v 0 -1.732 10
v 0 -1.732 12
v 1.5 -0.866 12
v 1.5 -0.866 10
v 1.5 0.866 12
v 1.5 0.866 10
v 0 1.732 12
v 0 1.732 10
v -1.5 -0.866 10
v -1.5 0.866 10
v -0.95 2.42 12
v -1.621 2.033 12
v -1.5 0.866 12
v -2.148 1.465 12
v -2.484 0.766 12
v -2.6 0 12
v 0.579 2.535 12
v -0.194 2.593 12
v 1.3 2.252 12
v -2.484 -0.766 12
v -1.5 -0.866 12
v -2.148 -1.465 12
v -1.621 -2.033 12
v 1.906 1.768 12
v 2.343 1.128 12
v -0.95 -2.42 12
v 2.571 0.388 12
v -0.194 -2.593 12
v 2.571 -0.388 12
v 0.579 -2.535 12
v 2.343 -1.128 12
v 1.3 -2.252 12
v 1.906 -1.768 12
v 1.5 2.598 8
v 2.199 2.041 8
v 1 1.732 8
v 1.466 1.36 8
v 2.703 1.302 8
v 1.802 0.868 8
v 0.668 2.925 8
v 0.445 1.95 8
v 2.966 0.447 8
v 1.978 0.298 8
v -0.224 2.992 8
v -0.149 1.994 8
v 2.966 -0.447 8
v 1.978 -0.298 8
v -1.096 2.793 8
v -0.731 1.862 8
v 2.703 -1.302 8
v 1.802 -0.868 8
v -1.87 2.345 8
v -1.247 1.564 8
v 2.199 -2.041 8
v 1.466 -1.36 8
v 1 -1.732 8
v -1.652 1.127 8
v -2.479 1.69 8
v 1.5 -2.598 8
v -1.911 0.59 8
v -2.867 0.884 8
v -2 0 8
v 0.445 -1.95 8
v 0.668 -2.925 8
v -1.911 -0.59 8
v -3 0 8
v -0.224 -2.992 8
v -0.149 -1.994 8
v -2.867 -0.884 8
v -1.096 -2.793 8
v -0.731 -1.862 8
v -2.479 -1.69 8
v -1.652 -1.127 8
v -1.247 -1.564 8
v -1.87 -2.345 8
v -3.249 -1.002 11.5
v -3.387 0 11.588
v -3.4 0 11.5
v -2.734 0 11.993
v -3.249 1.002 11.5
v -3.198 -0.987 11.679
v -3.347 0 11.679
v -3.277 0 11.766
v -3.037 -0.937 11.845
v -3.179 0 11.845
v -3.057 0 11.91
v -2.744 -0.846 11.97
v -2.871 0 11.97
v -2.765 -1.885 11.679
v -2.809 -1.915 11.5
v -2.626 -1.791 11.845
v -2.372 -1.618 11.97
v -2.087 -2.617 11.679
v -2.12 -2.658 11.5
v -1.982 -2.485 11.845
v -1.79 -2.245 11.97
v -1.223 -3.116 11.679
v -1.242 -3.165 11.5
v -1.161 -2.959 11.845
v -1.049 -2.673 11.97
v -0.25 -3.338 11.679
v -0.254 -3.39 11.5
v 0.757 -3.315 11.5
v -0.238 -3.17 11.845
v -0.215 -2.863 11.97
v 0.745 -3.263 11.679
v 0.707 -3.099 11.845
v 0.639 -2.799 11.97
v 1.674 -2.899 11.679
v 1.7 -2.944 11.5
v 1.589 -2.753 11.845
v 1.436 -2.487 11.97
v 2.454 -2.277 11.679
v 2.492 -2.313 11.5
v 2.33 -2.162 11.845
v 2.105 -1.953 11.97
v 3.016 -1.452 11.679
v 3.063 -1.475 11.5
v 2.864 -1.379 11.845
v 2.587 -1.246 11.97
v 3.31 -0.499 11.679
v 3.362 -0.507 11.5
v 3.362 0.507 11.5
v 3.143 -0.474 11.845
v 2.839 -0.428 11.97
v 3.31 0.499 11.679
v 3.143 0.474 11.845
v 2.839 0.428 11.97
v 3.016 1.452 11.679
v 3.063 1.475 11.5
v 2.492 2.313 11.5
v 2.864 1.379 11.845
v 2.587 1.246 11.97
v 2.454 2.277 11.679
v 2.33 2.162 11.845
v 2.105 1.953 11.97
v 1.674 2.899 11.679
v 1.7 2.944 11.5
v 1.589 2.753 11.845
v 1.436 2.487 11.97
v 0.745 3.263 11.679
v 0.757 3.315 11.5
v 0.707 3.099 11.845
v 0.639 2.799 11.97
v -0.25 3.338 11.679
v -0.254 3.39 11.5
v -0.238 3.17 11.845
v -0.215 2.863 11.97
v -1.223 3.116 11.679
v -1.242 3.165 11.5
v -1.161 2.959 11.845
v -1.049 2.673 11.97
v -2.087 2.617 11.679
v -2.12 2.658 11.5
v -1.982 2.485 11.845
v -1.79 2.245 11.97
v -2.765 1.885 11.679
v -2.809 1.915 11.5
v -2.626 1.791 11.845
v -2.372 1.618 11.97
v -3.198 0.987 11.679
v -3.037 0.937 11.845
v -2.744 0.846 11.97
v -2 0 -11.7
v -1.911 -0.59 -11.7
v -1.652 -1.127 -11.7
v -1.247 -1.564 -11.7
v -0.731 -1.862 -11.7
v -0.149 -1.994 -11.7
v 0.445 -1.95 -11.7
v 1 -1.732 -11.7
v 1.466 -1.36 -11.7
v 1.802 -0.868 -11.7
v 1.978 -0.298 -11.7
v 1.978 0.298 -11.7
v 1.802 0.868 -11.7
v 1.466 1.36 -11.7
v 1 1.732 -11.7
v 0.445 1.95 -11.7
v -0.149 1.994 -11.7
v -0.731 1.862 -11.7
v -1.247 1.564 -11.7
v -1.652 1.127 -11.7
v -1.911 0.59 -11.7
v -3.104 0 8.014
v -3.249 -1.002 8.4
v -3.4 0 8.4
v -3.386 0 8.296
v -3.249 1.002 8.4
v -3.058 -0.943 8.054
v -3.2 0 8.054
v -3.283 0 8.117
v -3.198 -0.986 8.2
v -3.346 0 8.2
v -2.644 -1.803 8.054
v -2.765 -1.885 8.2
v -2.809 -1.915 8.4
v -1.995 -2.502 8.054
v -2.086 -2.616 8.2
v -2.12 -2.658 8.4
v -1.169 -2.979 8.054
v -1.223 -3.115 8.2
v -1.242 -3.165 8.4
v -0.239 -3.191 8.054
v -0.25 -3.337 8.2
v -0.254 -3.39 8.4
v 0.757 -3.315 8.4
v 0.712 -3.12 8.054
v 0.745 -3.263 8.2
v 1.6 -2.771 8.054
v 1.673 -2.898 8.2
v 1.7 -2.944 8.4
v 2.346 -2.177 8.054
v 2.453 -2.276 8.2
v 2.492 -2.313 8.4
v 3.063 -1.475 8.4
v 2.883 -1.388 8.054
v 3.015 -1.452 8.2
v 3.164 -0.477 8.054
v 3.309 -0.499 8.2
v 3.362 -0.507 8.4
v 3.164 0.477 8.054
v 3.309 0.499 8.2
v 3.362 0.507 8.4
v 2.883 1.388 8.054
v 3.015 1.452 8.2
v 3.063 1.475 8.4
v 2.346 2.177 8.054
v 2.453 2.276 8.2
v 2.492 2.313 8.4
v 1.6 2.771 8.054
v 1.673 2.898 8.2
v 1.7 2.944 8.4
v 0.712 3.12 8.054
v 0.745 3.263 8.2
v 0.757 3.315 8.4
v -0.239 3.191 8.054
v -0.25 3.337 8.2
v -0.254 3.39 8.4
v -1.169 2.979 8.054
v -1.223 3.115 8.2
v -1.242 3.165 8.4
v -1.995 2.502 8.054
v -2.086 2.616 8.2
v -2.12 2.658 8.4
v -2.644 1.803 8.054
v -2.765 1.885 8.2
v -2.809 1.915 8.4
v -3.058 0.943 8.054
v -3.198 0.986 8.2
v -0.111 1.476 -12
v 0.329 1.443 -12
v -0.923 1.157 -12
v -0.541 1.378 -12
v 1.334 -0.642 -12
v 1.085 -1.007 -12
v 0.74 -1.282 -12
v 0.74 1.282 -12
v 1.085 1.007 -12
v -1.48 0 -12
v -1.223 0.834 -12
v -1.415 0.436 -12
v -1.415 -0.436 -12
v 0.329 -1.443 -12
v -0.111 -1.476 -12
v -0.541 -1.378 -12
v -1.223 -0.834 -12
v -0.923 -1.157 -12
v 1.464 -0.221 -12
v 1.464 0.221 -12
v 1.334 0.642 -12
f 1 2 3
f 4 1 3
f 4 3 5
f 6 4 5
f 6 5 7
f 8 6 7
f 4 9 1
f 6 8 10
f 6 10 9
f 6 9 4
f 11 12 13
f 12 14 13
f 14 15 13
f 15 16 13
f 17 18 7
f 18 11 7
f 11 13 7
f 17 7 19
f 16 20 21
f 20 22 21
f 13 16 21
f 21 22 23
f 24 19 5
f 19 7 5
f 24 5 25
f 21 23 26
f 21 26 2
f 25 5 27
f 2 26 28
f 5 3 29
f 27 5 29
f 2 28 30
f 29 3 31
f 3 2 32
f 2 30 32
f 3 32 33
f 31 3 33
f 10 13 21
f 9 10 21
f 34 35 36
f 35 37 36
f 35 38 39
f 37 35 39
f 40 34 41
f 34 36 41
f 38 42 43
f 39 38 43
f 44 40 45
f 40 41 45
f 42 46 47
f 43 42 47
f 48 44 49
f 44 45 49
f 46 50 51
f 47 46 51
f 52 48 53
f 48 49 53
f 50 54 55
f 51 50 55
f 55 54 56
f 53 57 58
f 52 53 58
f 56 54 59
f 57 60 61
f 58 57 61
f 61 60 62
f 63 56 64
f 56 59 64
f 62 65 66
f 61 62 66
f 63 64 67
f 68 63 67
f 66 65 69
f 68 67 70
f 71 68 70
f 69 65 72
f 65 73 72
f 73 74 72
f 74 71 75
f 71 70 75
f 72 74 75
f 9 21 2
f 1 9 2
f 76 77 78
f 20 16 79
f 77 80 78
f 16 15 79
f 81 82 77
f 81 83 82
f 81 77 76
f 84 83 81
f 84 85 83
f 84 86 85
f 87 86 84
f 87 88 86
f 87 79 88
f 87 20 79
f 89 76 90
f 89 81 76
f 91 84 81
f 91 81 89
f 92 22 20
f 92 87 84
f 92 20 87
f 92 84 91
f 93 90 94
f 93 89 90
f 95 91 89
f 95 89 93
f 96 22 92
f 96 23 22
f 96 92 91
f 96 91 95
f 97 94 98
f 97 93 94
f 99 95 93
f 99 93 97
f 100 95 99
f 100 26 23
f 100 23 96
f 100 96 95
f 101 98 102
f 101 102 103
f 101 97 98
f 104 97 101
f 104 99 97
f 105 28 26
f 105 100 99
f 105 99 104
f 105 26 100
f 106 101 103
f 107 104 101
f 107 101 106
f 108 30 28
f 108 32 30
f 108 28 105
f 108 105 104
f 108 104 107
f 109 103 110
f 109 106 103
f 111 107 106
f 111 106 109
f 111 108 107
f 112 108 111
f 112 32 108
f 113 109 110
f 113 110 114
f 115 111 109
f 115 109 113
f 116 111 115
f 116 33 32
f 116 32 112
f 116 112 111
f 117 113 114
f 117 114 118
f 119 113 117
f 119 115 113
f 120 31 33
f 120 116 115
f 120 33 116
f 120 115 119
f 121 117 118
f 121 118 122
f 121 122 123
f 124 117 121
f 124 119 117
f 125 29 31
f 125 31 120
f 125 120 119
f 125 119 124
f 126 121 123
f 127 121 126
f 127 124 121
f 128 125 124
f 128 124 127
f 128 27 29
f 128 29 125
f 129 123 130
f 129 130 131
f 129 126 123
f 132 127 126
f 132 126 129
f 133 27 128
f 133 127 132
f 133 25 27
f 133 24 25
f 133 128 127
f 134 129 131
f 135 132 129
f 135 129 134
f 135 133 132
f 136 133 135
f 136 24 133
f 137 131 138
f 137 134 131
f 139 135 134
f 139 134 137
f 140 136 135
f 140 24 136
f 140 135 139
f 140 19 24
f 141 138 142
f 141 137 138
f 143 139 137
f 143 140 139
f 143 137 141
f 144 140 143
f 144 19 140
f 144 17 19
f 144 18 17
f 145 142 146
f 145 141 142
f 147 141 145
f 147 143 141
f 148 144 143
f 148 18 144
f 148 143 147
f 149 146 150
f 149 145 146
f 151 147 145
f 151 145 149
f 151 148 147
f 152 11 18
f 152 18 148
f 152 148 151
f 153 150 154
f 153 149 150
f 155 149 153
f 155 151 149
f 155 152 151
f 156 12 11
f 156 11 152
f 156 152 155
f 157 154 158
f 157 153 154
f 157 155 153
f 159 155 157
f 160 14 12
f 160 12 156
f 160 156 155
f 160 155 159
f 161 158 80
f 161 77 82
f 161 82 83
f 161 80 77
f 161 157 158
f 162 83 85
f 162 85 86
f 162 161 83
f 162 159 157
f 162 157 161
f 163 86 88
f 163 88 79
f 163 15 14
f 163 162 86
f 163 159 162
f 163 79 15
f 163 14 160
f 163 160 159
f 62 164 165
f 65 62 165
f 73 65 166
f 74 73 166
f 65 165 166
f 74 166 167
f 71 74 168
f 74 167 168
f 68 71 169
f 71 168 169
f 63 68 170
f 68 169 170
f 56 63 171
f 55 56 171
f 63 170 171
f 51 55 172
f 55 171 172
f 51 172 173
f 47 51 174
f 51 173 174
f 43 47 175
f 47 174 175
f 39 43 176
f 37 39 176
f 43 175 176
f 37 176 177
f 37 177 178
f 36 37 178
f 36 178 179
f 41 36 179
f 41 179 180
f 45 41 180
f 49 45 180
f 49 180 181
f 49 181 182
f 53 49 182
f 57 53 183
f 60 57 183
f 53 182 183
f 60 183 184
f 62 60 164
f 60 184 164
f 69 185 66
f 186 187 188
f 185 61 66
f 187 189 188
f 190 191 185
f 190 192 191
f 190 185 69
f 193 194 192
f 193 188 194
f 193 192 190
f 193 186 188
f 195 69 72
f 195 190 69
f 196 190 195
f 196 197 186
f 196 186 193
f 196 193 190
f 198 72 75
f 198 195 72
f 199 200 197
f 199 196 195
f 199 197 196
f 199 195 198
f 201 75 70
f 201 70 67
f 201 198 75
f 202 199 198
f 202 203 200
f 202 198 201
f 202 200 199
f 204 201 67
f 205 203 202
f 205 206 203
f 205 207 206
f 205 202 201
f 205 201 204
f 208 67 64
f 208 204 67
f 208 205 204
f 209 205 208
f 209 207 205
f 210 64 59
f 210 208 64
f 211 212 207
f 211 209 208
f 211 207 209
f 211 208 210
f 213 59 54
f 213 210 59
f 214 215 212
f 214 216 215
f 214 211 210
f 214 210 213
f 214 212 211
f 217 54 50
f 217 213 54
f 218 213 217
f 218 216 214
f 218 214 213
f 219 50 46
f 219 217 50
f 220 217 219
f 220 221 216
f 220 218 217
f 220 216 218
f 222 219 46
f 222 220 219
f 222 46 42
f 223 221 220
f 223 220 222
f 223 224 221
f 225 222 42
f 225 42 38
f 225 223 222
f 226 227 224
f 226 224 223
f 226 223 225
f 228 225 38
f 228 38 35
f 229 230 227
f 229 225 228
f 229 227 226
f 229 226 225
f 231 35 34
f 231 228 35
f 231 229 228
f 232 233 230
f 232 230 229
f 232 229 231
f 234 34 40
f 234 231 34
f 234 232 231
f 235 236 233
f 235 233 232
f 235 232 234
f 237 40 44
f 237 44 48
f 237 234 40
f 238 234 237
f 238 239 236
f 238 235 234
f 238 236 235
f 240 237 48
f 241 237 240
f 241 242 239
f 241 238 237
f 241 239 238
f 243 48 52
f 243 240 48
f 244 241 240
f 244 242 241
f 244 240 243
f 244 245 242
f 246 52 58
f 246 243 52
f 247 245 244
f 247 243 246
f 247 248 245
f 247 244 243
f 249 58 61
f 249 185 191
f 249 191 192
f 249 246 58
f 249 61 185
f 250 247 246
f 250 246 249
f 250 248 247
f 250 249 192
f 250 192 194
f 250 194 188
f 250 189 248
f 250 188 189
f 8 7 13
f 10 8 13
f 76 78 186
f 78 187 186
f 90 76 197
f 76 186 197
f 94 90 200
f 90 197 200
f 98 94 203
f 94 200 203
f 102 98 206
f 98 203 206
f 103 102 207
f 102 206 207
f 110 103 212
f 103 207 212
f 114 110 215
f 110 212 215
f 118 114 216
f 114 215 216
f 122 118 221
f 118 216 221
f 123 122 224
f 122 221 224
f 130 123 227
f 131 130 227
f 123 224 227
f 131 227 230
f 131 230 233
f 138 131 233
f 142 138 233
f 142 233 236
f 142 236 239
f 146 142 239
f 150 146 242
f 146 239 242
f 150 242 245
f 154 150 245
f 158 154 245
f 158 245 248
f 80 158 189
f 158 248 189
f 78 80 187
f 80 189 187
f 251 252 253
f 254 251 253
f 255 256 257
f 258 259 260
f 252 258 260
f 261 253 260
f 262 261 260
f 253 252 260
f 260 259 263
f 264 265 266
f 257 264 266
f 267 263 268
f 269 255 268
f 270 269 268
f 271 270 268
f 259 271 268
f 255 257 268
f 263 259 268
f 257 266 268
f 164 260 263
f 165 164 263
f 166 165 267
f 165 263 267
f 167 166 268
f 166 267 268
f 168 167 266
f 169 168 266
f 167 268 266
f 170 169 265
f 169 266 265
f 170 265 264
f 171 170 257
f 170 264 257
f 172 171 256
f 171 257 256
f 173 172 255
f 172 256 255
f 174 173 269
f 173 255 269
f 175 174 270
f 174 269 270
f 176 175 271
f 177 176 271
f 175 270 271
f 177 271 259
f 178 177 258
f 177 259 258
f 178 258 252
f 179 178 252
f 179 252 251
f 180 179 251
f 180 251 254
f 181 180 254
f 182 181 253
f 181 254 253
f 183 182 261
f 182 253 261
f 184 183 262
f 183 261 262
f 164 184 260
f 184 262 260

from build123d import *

# Parameters (mm, degrees)
CHAMFER_1_SIZE      = 0.3
CHAMFER_1_SIZE2     = 0.519615242
FILLET_1_R          = 0.4
FILLET_2_SIZE       = 0.5
FILLET_2_SIZE_2     = 0.8
CUT_EXTRUDE_1_DEPTH = 2


with BuildPart() as part:
    # 草图2 → 旋转1 (revolve)
    with BuildSketch(Plane(origin=(0, 0, 0), x_dir=(0, 0, -1), z_dir=(1, 0, 0)), mode=Mode.PRIVATE) as revolve_1_sk:
        Polygon((-12, 0), (-12, 3.4), (-8, 3.4), (-8, 2), (12, 2), (12, 0), align=None)
    revolve(revolve_1_sk.sketch.rotate(Axis((0, 0, -12), (0, 0, 1)), 90), axis=Axis((0, 0, -12), (0, 0, 1)))

    # 倒角1
    chamfer_1_edges = [part.edges().sort_by_distance(p)[0] for p in [
        (2, 0, -12),
    ]]
    chamfer_1_side = [part.faces().sort_by_distance(p)[0] for p in [
        (2, 0, -2),
    ]]
    chamfer(chamfer_1_edges, length=CHAMFER_1_SIZE, length2=CHAMFER_1_SIZE2, reference=chamfer_1_side[0])

    # 圆角1
    fillet_1_edges = [part.edges().sort_by_distance(p)[0] for p in [
        (3.4, 0, 8),
    ]]
    fillet(fillet_1_edges, radius=FILLET_1_R)

    # 圆角2
    # an asymmetric fillet: 0.8, 0.5 mm, written as the material it takes off along each edge
    with BuildSketch(Plane(origin=(0, 0, 12), x_dir=(-1, 0, 0), z_dir=(0, 1, 0))) as fillet_2_piece_1:
        with BuildLine():
            Bezier((3.4, -FILLET_2_SIZE), (3.4, 0), (3.4 - FILLET_2_SIZE_2, 0), weights=[1, 0.707106781, 1])
            Line((3.4 - FILLET_2_SIZE_2, 0), (3.4, 0))
            Line((3.4, 0), (3.4, -FILLET_2_SIZE))
        make_face()
    revolve(axis=Axis((0, 0, 12), (0, 0, 1)), mode=Mode.SUBTRACT)

    # 草图3 → 切除-拉伸1 (cut)
    with BuildSketch(Plane.XY.offset(12)):
        Polygon((0, 1.732050808), (-1.5, 0.866025404), (-1.5, -0.866025404), (0, -1.732050808), (1.5, -0.866025404), (1.5, 0.866025404), align=None)
    extrude(amount=-CUT_EXTRUDE_1_DEPTH, mode=Mode.SUBTRACT)


solid = part.part
